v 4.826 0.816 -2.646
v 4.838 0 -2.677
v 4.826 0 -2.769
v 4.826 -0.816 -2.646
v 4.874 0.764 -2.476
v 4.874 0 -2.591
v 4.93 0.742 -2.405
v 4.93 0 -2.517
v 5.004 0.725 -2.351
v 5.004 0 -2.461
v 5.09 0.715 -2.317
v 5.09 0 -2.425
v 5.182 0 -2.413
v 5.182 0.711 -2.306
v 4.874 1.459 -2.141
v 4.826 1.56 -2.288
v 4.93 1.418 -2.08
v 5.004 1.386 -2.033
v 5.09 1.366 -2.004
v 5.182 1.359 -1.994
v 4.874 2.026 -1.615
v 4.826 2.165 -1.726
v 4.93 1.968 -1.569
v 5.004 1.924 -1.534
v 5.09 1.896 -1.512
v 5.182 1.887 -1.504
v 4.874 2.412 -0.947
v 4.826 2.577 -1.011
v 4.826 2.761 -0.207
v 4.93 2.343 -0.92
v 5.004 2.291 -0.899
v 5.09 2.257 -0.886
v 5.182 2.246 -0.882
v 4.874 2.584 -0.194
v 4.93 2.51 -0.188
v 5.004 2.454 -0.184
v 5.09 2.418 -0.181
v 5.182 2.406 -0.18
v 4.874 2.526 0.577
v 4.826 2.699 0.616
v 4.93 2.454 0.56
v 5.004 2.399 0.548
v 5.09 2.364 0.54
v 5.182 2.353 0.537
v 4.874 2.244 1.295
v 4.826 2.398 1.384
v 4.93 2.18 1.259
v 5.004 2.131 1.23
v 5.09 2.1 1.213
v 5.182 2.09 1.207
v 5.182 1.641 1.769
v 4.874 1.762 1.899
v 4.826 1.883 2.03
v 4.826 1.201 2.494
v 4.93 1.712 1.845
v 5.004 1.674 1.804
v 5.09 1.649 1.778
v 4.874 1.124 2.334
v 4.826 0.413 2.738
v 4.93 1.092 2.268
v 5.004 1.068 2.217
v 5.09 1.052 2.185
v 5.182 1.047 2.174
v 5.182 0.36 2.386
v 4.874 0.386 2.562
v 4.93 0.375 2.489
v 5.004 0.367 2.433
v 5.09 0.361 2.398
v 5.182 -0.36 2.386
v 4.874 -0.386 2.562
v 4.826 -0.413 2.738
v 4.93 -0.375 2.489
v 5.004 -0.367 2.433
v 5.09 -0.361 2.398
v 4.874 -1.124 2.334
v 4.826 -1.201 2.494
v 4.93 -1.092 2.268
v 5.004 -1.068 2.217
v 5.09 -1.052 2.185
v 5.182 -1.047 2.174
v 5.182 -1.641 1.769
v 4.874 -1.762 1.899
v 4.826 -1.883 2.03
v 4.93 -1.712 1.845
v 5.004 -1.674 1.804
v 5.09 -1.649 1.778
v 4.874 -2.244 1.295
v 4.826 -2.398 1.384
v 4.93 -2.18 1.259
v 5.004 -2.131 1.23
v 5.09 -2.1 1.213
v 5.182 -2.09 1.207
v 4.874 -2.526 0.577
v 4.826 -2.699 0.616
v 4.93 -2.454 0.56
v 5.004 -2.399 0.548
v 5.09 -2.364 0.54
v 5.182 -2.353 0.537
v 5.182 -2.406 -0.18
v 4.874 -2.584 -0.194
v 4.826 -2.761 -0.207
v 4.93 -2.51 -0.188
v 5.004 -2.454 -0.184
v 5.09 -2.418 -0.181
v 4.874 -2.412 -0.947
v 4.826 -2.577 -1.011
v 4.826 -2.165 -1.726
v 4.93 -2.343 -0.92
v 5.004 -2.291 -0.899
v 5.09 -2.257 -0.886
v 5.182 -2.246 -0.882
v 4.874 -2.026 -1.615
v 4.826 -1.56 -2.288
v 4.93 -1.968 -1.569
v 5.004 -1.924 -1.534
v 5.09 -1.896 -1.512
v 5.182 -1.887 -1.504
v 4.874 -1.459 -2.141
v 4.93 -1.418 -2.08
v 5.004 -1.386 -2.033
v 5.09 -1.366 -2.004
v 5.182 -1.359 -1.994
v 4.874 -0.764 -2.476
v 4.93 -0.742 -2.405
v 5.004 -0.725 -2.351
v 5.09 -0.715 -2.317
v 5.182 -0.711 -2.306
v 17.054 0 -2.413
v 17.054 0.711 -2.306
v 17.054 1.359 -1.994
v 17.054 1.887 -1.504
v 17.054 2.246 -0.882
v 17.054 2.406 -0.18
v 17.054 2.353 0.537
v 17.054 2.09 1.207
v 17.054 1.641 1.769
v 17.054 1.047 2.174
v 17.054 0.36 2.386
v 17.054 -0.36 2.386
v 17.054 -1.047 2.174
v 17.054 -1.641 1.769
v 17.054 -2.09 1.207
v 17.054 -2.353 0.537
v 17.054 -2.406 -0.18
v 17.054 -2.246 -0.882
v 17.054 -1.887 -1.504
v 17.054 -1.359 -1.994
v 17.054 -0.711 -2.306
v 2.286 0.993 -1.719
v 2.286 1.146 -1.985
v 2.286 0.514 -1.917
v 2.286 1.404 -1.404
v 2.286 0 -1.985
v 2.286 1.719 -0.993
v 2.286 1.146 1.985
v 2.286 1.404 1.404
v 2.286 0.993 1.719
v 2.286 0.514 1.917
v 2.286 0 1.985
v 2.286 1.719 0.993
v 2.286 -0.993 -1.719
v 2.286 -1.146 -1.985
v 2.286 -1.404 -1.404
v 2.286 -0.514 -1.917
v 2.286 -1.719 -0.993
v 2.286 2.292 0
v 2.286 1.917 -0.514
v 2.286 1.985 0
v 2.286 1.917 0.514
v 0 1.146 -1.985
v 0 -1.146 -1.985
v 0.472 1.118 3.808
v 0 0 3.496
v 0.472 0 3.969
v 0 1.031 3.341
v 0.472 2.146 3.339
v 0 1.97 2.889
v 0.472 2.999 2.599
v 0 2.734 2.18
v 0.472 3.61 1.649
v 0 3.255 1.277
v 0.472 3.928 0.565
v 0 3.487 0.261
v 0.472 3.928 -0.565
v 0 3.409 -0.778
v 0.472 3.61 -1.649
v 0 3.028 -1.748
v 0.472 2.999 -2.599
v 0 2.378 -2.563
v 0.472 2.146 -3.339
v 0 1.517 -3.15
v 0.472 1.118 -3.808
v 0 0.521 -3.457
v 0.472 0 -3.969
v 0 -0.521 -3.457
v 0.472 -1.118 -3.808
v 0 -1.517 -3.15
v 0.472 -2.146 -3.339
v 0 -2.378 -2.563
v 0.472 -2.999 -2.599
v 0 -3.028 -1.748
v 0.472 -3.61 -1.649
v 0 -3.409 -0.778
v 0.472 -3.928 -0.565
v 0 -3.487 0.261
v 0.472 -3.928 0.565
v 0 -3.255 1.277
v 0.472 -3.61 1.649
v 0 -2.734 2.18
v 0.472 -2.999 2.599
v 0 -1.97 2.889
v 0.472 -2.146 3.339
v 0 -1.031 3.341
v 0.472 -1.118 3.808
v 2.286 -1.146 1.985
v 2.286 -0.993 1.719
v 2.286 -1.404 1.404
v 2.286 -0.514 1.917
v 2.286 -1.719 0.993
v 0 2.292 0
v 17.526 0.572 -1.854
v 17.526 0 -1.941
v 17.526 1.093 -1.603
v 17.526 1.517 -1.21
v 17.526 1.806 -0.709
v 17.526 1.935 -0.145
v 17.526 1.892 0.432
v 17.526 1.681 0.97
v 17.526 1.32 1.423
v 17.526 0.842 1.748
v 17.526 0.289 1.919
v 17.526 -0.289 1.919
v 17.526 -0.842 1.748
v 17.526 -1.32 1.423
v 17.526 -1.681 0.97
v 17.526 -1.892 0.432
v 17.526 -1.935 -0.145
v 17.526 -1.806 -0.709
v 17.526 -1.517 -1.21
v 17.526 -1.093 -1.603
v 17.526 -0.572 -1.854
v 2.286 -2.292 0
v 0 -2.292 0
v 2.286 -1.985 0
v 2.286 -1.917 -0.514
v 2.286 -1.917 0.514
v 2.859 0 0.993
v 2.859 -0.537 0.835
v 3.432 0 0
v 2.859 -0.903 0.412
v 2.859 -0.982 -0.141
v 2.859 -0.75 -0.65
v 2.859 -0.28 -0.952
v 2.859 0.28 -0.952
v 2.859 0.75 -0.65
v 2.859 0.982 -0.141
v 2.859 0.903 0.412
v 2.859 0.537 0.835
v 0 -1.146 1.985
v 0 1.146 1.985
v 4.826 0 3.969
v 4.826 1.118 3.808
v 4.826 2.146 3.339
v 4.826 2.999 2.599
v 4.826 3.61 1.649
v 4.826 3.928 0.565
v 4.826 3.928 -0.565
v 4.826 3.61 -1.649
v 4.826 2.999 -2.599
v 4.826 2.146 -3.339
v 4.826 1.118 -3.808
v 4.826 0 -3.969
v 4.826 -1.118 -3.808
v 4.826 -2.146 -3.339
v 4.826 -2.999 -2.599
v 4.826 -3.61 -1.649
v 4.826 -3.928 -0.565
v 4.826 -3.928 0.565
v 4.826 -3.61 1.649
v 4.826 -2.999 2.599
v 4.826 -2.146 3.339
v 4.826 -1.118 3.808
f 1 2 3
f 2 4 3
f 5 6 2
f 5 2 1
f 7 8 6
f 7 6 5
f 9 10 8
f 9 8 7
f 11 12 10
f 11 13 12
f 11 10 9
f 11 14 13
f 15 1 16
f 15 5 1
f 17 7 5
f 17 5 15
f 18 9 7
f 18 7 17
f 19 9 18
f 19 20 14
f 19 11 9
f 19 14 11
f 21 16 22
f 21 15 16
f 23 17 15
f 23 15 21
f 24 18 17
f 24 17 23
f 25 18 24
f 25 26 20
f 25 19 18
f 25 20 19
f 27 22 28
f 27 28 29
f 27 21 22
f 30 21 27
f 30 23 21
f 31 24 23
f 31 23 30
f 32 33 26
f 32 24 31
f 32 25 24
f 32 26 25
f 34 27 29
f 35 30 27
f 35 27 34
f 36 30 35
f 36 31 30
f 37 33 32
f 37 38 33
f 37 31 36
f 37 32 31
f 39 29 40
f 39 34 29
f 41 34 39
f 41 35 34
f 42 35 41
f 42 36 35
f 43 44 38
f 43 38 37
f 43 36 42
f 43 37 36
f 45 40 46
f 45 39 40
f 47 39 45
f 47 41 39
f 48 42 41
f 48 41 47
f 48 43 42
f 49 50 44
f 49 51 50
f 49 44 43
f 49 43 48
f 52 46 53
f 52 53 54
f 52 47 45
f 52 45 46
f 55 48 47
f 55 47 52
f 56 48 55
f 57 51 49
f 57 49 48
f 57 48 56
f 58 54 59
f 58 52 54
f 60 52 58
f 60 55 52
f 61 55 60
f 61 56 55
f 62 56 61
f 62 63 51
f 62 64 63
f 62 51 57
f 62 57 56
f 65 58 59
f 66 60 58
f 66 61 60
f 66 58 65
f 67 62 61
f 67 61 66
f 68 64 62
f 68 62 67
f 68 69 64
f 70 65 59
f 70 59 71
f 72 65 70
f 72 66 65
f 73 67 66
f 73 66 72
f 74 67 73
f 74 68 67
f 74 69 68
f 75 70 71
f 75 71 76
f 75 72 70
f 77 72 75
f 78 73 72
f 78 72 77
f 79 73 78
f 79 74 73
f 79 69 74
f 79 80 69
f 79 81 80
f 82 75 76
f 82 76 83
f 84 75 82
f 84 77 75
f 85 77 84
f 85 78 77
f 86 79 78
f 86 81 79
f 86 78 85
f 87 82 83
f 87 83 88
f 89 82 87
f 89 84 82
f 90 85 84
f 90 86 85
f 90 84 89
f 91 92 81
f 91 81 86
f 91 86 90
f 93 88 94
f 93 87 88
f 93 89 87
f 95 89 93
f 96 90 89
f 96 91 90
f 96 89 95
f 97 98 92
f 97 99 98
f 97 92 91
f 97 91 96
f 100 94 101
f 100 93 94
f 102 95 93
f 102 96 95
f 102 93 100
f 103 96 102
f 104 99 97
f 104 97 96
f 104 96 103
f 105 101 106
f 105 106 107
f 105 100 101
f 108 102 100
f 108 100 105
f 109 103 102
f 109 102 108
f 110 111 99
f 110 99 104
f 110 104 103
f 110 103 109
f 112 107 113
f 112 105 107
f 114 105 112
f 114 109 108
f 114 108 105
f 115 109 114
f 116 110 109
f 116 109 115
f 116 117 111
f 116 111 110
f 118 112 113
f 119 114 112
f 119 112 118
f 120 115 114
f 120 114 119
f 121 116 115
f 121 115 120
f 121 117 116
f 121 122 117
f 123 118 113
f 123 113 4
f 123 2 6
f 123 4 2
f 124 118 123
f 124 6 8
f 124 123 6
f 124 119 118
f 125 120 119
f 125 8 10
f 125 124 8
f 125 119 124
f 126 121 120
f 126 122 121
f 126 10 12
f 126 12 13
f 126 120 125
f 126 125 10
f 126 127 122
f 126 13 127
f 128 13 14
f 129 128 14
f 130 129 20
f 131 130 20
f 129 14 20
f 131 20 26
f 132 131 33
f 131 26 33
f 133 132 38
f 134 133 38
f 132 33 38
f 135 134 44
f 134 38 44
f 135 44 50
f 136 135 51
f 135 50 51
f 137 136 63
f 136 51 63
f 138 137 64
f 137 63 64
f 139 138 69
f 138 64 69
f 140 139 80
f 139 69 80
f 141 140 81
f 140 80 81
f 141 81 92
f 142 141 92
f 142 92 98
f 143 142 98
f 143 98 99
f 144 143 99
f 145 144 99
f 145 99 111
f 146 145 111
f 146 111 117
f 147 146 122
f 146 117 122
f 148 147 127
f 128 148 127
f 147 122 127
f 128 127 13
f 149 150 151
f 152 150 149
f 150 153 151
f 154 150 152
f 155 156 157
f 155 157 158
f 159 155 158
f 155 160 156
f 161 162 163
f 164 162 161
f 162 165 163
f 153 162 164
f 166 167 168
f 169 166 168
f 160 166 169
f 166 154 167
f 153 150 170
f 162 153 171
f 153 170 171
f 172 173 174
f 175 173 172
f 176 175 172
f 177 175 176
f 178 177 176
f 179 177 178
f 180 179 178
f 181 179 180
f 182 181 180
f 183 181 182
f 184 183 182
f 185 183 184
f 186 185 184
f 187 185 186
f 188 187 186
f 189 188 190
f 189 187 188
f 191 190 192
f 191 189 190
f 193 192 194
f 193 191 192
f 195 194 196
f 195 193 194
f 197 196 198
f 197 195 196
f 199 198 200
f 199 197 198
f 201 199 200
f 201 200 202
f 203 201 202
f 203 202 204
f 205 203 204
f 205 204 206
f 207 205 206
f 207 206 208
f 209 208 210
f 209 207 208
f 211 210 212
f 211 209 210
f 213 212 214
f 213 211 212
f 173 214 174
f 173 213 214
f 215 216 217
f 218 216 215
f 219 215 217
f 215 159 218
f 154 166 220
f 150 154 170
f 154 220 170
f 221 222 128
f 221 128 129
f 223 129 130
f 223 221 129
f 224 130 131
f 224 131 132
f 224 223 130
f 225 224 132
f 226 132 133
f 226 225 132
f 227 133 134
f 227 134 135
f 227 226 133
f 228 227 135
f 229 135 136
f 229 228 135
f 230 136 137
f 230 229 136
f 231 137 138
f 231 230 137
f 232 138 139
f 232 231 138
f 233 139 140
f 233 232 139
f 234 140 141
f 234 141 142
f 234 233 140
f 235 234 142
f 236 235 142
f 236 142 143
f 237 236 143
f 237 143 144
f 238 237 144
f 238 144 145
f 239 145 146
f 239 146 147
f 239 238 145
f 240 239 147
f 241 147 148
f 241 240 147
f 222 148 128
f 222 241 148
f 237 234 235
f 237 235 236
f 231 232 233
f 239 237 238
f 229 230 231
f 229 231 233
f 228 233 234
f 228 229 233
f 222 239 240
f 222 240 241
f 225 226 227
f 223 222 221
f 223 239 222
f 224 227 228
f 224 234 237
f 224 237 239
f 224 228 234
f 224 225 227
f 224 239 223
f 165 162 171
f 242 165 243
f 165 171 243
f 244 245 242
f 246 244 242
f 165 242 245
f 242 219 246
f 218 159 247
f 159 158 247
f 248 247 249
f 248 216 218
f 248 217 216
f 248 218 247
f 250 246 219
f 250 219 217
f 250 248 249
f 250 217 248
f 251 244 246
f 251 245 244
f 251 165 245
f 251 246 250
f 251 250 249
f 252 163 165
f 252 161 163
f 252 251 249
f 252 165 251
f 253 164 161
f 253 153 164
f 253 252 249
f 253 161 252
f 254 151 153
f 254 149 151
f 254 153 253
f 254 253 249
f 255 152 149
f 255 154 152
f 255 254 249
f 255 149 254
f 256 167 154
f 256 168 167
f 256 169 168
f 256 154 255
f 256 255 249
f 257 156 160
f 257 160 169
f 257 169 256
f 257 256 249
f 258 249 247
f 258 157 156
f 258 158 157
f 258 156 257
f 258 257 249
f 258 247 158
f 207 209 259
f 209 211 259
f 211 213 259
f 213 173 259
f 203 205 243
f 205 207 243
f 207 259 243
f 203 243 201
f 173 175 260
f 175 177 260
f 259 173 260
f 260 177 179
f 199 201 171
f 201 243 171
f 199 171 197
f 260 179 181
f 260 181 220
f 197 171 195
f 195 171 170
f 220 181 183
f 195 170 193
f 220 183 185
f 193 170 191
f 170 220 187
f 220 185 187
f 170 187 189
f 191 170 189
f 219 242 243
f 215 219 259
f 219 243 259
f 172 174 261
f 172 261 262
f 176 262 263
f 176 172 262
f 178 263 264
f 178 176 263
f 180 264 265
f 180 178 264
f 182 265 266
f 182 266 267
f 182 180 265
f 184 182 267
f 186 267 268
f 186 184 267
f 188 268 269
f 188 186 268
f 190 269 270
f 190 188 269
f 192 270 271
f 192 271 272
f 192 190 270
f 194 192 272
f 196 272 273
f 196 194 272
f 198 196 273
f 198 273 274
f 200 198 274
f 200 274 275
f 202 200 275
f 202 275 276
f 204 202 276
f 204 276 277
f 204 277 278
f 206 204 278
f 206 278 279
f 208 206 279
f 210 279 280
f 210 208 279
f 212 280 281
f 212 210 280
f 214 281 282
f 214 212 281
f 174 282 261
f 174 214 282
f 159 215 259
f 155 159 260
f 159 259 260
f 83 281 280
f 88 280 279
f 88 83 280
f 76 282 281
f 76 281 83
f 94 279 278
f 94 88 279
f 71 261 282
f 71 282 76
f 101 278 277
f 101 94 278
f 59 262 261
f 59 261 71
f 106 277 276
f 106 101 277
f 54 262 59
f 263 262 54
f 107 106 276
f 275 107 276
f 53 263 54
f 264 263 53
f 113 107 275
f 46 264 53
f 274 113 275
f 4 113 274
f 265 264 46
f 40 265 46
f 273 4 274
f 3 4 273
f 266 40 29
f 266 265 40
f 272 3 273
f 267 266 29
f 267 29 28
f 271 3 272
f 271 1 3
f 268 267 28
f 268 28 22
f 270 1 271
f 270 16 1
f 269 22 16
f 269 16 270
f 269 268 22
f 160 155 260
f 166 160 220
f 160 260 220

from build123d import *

# Parameters (mm, degrees)
SKETCH1_W           = 4.826
SKETCH1_H           = 3.96875
SKETCH2_R           = 2.413
BOSS_EXTRUDE1_DEPTH = 12.7
CUT_EXTRUDE1_DEPTH  = 2.286
CHAMFER1_SIZE       = 0.47244
FILLET1_R           = 0.3556


with BuildPart() as part:
    # Sketch1 → Revolve1 (revolve)
    with BuildSketch(Plane(origin=(0, 0, 0), x_dir=(-1, 0, 0), z_dir=(0, 0, -1)), mode=Mode.PRIVATE) as revolve1_sk:
        with Locations((-2.413, 1.984375)):
            Rectangle(SKETCH1_W, SKETCH1_H)
    revolve(revolve1_sk.sketch.rotate(Axis((4.826, 0, 0), (-1, 0, 0)), 270), axis=Axis((4.826, 0, 0), (-1, 0, 0)))

    # Sketch2 → Boss-Extrude1 (add)
    with BuildSketch(Plane(origin=(4.826, 0, 0), x_dir=(0, 0, -1), z_dir=(1, 0, 0))):
        Circle(SKETCH2_R)
    extrude(amount=BOSS_EXTRUDE1_DEPTH)

    # Sketch3 → Cut-Extrude1 (cut)
    with BuildSketch(Plane.ZY):
        Polygon((0, -2.292092116), (1.98501, -1.146046058), (1.98501, 1.146046058), (0, 2.292092116), (-1.98501, 1.146046058), (-1.98501, -1.146046058), align=None)
    extrude(amount=-CUT_EXTRUDE1_DEPTH, mode=Mode.SUBTRACT)

    # Sketch4 → Cut-Revolve1 (revolve, cut)
    with BuildSketch(Plane.XY, mode=Mode.PRIVATE) as cut_revolve1_sk:
        Polygon((2.286, 1.98501), (2.286, 0), (3.432046058, 0), align=None)
    revolve(cut_revolve1_sk.sketch.rotate(Axis((2.286, 0, 0), (1, 0, 0)), 90), axis=Axis((2.286, 0, 0), (1, 0, 0)), mode=Mode.SUBTRACT)

    # Chamfer1
    chamfer1_edges = [part.edges().sort_by_distance(p)[0] for p in [
        (0, 0, -3.96875),
        (17.526, 0, 2.413),
    ]]
    chamfer(chamfer1_edges, length=CHAMFER1_SIZE)

    # Fillet1
    fillet1_edges = [part.edges().sort_by_distance(p)[0] for p in [
        (4.826, 0, 2.413),
    ]]
    fillet(fillet1_edges, radius=FILLET1_R)


solid = part.part
